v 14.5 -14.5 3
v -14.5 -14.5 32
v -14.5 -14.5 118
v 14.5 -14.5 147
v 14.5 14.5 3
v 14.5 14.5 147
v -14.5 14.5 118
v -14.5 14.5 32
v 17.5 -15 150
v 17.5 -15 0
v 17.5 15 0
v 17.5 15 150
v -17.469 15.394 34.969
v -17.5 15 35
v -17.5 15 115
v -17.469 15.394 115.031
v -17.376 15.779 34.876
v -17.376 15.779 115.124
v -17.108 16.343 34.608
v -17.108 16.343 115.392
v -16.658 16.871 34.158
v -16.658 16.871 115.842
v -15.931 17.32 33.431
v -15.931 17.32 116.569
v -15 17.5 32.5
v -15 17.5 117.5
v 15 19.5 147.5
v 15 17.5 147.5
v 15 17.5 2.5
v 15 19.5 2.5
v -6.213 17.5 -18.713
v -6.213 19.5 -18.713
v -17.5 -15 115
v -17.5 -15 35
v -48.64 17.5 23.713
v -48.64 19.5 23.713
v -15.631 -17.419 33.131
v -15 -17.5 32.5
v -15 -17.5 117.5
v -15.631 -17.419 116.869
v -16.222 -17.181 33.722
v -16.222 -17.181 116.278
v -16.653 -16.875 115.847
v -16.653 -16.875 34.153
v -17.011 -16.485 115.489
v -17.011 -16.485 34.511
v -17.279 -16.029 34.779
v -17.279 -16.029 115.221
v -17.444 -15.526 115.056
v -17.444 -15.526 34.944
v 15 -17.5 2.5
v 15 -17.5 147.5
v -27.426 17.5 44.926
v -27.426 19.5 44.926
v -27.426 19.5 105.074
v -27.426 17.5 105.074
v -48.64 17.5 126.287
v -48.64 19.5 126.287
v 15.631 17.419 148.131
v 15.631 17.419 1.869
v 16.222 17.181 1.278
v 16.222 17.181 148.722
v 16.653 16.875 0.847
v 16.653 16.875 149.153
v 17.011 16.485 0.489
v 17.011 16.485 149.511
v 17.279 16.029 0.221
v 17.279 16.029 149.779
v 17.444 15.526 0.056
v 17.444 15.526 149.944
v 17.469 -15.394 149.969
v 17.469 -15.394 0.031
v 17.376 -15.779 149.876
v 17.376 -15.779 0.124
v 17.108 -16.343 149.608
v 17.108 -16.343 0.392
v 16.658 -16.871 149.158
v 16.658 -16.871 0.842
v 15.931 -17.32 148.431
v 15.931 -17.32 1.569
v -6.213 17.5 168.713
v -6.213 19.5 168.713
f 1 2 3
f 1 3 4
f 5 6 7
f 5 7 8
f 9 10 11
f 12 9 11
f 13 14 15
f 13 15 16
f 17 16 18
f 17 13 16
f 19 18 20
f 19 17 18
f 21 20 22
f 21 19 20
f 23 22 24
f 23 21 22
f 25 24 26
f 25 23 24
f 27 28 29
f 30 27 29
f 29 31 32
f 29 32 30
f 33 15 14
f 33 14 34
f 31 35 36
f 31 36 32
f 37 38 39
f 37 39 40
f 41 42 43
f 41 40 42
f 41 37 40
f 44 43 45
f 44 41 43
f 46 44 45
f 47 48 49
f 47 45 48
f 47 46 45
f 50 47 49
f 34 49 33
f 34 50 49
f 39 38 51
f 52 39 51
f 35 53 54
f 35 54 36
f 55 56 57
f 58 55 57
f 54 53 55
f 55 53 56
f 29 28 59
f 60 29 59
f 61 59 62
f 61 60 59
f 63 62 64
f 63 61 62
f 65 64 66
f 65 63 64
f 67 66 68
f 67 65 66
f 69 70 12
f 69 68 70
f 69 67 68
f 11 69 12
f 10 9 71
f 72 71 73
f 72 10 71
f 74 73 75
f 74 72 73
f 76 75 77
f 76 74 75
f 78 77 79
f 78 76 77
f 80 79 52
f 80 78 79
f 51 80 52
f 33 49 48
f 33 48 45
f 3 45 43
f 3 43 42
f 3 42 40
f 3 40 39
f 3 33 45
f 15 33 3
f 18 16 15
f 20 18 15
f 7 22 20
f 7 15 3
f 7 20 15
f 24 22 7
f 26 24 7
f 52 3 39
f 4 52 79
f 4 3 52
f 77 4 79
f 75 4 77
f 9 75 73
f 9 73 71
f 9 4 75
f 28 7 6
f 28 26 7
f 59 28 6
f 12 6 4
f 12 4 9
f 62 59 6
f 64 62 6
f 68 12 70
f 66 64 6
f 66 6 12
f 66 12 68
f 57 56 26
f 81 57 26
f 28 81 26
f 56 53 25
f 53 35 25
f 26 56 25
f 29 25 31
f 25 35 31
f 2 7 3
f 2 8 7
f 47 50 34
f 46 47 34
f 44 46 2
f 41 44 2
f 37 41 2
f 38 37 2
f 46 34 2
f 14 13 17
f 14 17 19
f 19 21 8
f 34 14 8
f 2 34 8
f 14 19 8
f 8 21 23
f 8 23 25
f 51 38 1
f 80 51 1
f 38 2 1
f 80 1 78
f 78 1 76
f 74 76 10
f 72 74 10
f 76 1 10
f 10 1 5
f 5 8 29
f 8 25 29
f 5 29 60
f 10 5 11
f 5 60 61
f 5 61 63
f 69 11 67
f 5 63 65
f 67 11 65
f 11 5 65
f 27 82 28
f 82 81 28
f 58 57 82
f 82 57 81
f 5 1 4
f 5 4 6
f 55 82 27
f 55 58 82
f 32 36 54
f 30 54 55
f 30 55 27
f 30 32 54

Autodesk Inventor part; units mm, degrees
ref_plane "YZ Plane" through (0, 0, 0) normal (1, 0, 0) x (0, 1, 0)
ref_plane "XZ Plane" through (0, 0, 0) normal (0, 1, 0) x (-1, 0, 0)
ref_plane "XY Plane" through (0, 0, 0) normal (0, 0, 1) x (1, 0, 0)
sketch "Sketch1" plane through (0, 0, 0) normal (0, 0, 1) x (1, 0, 0)
  line L0 (-15, -17.5) -> (15, -17.5)
  line L1 (17.5, -15) -> (17.5, 15)
  line L2 (15, 17.5) -> (-15, 17.5)
  line L3 (-17.5, 15) -> (-17.5, -15)
  line L4 (-17.5, -17.5) -> (17.5, 17.5) construction
  line L5 (17.5, -17.5) -> (-17.5, 17.5) construction
  line L6 (-14.5, -14.5) -> (14.5, -14.5)
  line L7 (14.5, -14.5) -> (14.5, 14.5)
  line L8 (14.5, 14.5) -> (-14.5, 14.5)
  line L9 (-14.5, 14.5) -> (-14.5, -14.5)
  line L10 (-14.5, -14.5) -> (14.5, 14.5) construction
  line L11 (14.5, -14.5) -> (-14.5, 14.5) construction
  arc A0 (-15, 17.5) -> (-17.5, 15) centre (-15, 15) ccw
  arc A1 (17.5, 15) -> (15, 17.5) centre (15, 15) ccw
  arc A2 (15, -17.5) -> (17.5, -15) centre (15, -15) ccw
  arc A3 (-17.5, -15) -> (-15, -17.5) centre (-15, -15) ccw
  point P0 (0, 0)
  dimension "d0" = 35
  dimension "d1" = 35
  dimension "d2" = 29
  dimension "d3" = 29
  dimension "d4" = 2.5
extrude "Extrusion1" add sketch "Sketch1" along normal blind 150
sketch "Sketch2" plane through (-15, 17.5, 0) normal (0, 1, 0) x (1, 0, 0)
  line L0 (30, 0) -> (0, 0) construction
  line L1 (0, 0) -> (0, -150) construction
  line L2 (30, -150) -> (0, -150) construction
  line L3 (30, 0) -> (30, -150) construction
  line L4 (-2.5, 0) -> (-2.5, -150) construction
  line L5 (32.5, 0) -> (32.5, -150) construction
  line L6 (-7.5, 0) -> (32.5, 0)
  line L7 (-7.5, 0) -> (-7.5, -40)
  line L8 (-7.5, -40) -> (32.5, 0)
  line L9 (0, 0) -> (0, -150) construction
  line L10 (0, -75) -> (29.5, -75) construction
  line L11 (29.5, 0) -> (29.5, -150) construction
  line L12 (-7.5, -150) -> (32.5, -150)
  line L13 (-7.5, -150) -> (-7.5, -110)
  line L14 (-7.5, -110) -> (32.5, -150)
  point P0 (15, 0)
  dimension "d7" = 40
  dimension "d8" = 40
extrude "Extrusion2" cut sketch "Sketch2" against normal blind 100
sketch "Sketch5" plane through (15, 17.5, 147.5) normal (0, 1, 0) x (1, 0, 0)
  line L0 (-30, 30) -> (0, 0) construction
  line L1 (2.5, -2.5) -> (0, 0) projected
  line L2 (0, 0) -> (-42.4264, 42.4264) construction
  line L3 (-42.4264, 42.4264) -> (-63.6396, 21.2132)
  line L4 (-63.6396, 21.2132) -> (-21.2132, -21.2132)
  line L5 (-21.2132, -21.2132) -> (0, 0)
  line L6 (0, 145) -> (-30, 115) construction
  line L7 (0, 145) -> (2.5, 147.5) projected
  line L8 (0, 0) -> (0, 145)
  line L9 (-30, 115) -> (-30, 30) construction
  line L10 (-30, 72.5) -> (-0.5, 72.5) construction
  line L11 (-0.5, 144.5) -> (-0.5, 0.5) construction
  line L12 (0, 145) -> (-42.4264, 102.5736) construction
  line L13 (-42.4264, 102.5736) -> (-63.6396, 123.7868)
  line L14 (-63.6396, 123.7868) -> (-21.2132, 166.2132)
  line L15 (-21.2132, 166.2132) -> (0, 145)
  line L16 (-42.4264, 102.5736) -> (-42.4264, 42.4264)
  point P0 (-15, 147.5)
  dimension "d18" = 60
  dimension "d19" = 30
extrude "Extrusion5" add sketch "Sketch5" along normal blind 2
properties part number "TestPlate" material "Steel, Mild"
